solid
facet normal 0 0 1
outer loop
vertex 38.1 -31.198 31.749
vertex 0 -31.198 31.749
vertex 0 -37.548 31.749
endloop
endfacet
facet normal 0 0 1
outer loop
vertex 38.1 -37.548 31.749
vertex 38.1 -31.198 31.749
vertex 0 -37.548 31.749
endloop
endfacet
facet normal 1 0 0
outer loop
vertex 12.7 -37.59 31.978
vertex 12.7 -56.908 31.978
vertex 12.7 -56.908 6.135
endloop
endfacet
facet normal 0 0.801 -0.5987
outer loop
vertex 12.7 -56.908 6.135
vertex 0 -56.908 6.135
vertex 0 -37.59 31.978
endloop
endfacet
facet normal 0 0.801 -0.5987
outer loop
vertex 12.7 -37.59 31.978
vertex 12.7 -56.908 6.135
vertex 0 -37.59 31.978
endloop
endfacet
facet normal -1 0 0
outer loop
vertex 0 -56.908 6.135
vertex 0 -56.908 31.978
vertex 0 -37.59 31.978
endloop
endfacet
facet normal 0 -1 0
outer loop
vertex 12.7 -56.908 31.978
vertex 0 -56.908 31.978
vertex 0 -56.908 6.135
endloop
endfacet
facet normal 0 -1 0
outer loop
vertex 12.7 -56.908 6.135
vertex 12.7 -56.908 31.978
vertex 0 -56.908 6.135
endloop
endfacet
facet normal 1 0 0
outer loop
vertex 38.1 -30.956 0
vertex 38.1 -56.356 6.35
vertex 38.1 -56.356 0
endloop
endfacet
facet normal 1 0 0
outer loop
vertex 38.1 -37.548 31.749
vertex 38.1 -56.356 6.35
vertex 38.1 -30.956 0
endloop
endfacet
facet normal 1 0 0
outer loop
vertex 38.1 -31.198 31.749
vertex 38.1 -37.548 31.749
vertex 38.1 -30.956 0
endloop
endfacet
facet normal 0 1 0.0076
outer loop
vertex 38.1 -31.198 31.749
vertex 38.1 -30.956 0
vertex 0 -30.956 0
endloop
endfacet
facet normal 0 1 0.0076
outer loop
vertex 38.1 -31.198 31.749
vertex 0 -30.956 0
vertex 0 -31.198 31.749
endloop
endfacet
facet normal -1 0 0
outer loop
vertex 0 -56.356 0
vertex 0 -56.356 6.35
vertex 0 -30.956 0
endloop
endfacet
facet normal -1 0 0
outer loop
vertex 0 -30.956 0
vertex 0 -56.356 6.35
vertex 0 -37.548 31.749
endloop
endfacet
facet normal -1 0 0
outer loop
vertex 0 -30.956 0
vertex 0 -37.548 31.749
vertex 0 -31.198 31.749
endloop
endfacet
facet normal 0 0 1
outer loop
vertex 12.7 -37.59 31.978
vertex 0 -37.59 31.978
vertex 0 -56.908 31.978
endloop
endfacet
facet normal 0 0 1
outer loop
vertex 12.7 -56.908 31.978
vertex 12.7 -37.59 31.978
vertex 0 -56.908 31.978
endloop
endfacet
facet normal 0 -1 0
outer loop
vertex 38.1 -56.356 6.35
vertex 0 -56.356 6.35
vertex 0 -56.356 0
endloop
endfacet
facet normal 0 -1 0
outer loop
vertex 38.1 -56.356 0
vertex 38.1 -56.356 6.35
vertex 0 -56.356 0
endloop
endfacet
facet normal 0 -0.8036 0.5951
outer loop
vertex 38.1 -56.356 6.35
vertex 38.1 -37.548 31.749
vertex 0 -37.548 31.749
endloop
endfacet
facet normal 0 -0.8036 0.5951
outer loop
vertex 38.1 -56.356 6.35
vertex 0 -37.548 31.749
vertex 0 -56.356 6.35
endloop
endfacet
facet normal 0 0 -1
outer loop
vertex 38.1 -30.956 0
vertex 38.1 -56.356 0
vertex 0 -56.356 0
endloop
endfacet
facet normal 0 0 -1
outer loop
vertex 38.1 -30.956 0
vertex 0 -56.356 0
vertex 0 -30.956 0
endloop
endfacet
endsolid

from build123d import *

# Parameters (mm, degrees)
F1_DEPTH = 38.1
F3_DEPTH = 12.7


with BuildPart() as f1:
    # F0 (on Right) → F1 (new body)
    with BuildSketch(Plane.YZ):
        Polygon((-56.35625, 6.35), (-56.35625, 0), (-30.95625, 0), (-31.197688, 31.749082), (-37.547688, 31.749082), align=None)
    extrude(amount=F1_DEPTH)


with BuildPart() as f3:
    # F2 (on Right) → F3 (new body)
    with BuildSketch(Plane.YZ):
        Polygon((-56.907602, 6.134535), (-37.590344, 31.977896), (-56.907602, 31.977896), align=None)
    extrude(amount=F3_DEPTH)


solid = Compound([f1.part, f3.part])
